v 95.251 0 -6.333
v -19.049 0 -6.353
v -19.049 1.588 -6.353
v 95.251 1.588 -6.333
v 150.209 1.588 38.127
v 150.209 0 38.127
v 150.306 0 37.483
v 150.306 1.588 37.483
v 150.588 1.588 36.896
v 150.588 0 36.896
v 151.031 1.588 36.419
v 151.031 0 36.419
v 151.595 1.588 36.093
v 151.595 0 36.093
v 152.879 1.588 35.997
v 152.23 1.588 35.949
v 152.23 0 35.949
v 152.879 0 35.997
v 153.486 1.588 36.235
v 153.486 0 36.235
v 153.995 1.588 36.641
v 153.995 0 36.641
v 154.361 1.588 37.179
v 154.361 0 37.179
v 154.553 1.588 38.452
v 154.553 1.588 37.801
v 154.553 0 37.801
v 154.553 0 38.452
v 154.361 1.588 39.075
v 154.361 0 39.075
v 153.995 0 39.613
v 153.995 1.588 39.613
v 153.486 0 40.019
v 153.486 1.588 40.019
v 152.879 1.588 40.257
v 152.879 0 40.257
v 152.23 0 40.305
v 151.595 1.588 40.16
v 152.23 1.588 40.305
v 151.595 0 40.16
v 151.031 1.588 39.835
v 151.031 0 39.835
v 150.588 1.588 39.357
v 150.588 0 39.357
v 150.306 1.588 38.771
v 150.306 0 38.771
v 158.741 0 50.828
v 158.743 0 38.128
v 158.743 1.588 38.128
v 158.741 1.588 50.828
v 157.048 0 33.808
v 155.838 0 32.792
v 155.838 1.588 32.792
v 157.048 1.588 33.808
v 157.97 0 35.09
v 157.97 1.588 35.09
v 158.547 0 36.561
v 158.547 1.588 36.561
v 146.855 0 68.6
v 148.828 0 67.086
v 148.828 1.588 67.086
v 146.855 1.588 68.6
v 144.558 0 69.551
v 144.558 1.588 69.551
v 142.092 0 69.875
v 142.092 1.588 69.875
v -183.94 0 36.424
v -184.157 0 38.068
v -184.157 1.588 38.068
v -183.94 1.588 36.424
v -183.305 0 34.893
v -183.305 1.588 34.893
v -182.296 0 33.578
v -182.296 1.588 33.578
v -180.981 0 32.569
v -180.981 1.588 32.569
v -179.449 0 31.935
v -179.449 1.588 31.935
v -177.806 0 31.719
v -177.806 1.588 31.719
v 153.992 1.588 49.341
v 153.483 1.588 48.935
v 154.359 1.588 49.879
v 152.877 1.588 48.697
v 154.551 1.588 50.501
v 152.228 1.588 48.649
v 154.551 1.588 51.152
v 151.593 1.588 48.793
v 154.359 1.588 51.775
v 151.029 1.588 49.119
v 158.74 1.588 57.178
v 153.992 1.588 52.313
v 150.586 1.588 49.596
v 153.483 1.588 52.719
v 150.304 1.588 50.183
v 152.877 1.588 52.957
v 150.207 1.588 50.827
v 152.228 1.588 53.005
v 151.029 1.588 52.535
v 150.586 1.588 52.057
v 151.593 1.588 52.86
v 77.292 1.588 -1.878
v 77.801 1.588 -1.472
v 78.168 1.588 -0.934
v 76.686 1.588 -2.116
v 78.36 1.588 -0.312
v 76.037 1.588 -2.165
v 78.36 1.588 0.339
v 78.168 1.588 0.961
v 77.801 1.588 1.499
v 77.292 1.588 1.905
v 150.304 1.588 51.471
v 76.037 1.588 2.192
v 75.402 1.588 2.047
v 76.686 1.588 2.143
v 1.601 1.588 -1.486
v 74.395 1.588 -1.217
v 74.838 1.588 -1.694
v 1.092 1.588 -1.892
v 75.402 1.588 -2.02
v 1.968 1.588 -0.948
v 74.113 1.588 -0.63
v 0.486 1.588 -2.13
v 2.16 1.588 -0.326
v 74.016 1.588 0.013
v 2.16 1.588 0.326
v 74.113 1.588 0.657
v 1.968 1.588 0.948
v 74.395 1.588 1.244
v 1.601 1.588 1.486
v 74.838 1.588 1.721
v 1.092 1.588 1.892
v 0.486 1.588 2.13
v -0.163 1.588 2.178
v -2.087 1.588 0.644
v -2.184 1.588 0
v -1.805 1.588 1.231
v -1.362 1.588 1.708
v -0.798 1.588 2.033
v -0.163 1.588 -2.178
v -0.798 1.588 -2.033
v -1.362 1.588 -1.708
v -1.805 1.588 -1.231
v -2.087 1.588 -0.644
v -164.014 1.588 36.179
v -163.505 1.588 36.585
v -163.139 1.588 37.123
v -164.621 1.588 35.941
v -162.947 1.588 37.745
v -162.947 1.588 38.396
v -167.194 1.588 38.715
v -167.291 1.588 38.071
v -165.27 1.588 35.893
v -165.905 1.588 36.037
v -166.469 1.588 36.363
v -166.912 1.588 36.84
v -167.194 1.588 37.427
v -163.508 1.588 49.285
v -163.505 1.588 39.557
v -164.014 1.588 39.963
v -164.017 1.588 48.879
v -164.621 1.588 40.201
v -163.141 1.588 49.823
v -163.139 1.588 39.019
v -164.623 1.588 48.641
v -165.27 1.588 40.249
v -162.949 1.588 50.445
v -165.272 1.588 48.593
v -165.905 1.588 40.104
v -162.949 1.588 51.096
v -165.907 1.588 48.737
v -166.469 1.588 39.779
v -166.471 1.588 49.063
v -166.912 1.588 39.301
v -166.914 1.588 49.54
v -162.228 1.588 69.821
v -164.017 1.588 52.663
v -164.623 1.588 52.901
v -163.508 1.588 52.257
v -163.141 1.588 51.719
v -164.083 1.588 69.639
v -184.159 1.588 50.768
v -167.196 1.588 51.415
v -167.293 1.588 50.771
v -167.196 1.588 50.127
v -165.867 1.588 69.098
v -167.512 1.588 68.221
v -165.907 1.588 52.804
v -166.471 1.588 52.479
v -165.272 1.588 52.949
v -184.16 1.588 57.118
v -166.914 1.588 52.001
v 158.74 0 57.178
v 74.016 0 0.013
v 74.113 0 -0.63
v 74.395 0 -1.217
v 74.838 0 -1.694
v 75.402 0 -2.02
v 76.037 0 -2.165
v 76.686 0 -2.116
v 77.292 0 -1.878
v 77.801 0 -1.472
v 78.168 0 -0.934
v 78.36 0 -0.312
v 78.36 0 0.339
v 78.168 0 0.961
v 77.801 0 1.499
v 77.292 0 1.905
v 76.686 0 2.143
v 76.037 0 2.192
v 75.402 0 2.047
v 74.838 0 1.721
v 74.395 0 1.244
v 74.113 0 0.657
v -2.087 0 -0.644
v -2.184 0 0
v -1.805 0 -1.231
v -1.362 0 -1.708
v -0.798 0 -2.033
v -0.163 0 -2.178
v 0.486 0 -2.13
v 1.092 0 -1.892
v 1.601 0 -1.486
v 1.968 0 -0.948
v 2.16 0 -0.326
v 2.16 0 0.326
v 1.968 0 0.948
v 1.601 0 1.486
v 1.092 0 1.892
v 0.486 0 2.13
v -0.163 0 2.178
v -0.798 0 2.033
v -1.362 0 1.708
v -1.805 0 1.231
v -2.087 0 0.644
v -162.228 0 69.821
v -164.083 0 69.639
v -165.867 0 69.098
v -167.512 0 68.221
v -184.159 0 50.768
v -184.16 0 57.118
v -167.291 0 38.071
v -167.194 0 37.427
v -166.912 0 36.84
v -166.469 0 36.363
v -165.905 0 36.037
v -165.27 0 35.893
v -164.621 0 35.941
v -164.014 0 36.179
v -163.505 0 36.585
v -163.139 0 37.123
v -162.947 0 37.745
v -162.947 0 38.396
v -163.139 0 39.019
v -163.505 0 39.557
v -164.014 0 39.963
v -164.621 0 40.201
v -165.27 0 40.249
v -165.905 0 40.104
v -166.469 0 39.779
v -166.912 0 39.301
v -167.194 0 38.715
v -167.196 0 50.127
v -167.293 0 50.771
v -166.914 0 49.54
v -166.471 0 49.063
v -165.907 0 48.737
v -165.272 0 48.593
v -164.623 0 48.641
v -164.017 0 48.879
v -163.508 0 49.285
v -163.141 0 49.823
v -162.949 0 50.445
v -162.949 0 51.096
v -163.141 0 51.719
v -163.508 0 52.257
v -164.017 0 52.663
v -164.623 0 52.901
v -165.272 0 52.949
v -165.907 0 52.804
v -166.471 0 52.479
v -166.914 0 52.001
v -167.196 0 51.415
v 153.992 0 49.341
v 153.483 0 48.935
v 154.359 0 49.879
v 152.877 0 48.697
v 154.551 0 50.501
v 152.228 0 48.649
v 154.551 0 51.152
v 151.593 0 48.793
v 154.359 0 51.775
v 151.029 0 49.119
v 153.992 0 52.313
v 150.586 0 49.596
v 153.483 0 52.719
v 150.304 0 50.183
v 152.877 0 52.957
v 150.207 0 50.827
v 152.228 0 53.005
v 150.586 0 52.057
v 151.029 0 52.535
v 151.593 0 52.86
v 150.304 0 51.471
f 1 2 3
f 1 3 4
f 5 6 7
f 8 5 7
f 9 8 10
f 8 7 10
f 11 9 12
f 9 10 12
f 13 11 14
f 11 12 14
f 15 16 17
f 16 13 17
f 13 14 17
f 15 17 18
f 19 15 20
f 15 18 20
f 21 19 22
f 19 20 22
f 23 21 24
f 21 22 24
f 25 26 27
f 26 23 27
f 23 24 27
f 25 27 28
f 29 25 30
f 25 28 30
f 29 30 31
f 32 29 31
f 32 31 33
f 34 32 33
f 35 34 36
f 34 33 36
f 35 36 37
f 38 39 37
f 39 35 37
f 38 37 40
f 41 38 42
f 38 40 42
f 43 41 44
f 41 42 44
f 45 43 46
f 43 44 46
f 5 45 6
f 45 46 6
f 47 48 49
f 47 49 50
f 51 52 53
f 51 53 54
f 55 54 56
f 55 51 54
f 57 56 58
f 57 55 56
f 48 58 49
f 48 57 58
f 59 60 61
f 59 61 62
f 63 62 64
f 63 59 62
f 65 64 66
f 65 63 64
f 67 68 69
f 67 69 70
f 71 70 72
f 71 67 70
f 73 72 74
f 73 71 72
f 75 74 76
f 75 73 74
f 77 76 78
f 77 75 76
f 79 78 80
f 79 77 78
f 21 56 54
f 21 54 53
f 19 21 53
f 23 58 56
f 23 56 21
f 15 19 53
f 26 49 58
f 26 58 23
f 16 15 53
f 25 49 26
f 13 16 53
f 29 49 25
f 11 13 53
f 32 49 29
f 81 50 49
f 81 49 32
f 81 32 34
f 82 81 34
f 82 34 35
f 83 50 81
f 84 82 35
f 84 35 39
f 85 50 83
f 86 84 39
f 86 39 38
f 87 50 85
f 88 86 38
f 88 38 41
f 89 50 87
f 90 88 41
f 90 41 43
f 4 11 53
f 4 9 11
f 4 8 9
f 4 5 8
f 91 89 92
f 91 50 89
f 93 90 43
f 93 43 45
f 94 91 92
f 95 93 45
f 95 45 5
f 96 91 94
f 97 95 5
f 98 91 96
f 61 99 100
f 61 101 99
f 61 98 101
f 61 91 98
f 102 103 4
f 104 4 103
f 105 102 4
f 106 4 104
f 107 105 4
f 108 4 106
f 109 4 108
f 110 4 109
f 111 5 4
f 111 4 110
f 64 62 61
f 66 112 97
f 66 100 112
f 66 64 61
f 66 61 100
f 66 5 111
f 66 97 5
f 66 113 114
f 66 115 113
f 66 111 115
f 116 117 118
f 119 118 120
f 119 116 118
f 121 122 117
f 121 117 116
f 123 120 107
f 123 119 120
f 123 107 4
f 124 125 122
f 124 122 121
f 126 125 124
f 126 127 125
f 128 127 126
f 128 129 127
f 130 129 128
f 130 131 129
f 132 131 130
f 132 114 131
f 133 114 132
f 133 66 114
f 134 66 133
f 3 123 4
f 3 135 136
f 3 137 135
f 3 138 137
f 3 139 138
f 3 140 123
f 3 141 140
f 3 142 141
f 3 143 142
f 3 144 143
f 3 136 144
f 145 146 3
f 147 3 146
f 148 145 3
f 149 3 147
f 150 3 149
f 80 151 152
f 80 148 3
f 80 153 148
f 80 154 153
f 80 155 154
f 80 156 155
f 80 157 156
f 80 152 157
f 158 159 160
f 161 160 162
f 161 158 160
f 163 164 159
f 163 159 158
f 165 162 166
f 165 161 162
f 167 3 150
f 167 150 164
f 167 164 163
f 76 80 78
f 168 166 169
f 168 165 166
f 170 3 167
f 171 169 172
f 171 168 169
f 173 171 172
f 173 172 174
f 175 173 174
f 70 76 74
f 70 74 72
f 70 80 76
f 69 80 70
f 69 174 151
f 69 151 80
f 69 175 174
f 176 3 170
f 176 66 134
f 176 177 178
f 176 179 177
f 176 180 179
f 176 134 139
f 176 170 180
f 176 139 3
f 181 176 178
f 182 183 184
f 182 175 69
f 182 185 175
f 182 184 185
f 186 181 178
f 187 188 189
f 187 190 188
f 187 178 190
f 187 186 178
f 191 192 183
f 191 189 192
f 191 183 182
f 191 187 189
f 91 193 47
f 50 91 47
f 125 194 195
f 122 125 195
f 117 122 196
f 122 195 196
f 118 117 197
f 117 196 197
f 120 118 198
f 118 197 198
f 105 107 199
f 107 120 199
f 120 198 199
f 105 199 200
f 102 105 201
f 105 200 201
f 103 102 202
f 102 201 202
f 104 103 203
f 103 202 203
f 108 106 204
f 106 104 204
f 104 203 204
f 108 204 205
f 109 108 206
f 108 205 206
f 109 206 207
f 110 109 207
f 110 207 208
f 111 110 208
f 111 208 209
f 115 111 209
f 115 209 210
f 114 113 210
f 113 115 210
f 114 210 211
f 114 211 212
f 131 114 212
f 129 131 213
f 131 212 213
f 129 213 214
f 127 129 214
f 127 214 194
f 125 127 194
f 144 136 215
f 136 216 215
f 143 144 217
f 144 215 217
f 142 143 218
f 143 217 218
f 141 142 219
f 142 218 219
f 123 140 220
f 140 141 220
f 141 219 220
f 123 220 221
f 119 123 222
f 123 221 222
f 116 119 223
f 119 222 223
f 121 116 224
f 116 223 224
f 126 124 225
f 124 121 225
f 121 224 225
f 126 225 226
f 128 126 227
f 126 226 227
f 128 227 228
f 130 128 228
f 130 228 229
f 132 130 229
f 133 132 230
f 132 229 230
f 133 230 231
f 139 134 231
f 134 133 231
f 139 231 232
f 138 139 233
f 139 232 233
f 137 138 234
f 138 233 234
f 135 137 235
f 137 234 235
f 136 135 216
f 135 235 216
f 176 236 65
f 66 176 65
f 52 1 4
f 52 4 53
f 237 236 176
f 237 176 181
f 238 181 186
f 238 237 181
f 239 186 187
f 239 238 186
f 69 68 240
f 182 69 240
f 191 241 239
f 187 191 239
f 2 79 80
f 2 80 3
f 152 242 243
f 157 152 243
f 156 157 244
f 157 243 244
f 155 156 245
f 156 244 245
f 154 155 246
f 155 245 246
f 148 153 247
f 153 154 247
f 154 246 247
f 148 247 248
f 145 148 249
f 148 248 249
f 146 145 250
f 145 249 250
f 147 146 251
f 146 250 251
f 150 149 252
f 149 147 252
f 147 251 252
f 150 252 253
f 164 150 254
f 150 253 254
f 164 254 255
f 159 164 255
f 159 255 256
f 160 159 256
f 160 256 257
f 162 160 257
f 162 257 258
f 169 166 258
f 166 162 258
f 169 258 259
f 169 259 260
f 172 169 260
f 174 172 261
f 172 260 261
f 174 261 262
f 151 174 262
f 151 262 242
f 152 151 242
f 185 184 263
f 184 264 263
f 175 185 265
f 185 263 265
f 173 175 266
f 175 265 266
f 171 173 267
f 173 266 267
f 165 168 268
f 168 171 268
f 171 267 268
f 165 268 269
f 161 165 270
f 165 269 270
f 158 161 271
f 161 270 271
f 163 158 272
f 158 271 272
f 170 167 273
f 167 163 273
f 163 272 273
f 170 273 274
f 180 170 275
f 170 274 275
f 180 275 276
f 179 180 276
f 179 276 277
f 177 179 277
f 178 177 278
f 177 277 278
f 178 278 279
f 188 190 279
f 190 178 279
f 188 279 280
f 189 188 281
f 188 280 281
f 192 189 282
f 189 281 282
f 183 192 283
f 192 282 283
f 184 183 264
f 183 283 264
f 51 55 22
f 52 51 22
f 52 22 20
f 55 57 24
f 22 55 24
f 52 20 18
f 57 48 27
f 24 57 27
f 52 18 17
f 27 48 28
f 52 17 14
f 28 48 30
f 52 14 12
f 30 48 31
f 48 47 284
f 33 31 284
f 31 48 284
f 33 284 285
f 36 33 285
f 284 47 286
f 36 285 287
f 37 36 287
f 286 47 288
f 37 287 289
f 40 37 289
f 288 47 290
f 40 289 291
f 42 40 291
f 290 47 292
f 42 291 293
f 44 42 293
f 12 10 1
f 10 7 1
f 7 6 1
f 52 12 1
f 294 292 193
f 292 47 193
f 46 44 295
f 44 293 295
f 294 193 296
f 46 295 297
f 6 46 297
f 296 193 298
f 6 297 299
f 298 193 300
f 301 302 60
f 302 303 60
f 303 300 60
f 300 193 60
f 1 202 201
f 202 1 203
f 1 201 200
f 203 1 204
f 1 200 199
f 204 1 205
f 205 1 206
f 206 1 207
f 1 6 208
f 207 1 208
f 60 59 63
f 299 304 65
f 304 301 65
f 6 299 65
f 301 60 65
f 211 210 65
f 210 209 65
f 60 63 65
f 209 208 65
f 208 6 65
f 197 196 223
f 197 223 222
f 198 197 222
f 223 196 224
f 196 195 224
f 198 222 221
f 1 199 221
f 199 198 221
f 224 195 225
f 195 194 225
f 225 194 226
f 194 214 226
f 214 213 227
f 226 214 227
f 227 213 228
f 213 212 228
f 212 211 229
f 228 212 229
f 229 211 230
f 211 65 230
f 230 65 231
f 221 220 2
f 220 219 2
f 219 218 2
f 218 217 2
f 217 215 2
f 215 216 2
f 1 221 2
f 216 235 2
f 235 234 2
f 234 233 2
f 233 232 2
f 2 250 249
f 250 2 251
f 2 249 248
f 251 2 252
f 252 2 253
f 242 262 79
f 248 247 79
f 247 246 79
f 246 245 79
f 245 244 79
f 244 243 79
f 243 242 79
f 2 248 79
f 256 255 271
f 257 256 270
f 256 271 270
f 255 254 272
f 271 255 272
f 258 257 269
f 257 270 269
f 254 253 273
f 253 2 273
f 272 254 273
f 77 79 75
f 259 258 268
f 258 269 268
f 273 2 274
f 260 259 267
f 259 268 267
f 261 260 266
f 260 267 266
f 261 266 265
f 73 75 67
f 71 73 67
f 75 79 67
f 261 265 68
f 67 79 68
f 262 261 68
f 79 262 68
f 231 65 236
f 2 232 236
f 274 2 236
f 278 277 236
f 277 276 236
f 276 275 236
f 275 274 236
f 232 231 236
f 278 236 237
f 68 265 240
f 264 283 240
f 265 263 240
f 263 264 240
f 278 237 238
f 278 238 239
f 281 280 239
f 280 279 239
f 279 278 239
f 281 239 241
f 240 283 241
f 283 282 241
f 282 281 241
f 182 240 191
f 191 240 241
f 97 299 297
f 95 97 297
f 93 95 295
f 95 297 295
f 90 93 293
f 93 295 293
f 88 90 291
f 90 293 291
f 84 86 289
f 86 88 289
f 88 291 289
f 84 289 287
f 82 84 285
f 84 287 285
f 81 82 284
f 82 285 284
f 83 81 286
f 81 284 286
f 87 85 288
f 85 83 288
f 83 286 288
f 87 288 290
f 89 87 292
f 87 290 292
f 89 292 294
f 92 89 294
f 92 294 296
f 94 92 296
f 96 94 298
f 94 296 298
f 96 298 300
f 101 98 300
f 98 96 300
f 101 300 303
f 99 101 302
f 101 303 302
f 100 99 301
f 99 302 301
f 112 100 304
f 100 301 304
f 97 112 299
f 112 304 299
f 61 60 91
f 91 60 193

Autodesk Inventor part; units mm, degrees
ref_plane "YZ Plane" through (0, 0, 0) normal (1, 0, 0) x (0, 1, 0)
ref_plane "XZ Plane" through (0, 0, 0) normal (0, 1, 0) x (-1, 0, 0)
ref_plane "XY Plane" through (0, 0, 0) normal (0, 0, 1) x (1, 0, 0)
sketch "main" plane through (0, 0, 0) normal (0, 0, 1) x (1, 0, 0)
  circle A0 centre (45.9011, -170.4057) radius 2.1844
  circle A1 centre (58.6011, -170.4057) radius 2.1844
  arc A2 (39.5511, -183.1057) -> (45.9011, -189.4557) centre (45.9011, -183.1057) ccw
  line L0 (45.9011, -189.4557) -> (58.6011, -189.4557)
  line L1 (39.5511, -183.1057) -> (1.4511, -24.3557)
  arc A3 (76.0514, -172.8053) -> (77.6511, -167.5218) centre (68.1261, -167.5218) ccw
  line L2 (64.9511, -189.4557) -> (76.0514, -172.8053)
  line L3 (58.6011, -189.4557) -> (64.9511, -189.4557)
  circle A4 centre (45.9011, 147.0943) radius 2.1844
  circle A5 centre (58.6011, 147.0943) radius 2.1844
  circle A6 centre (7.8011, -5.3057) radius 2.1844
  circle A7 centre (7.8011, 70.8943) radius 2.1844
  line L4 (77.6511, -167.5218) -> (77.6511, 136.7989)
  line L5 (1.4511, -24.3557) -> (1.4511, 89.9443)
  arc A8 (77.6511, 136.7989) -> (74.8613, 143.5341) centre (68.1261, 136.7989) ccw
  line L6 (74.8613, 143.5341) -> (64.9511, 153.4443)
  line L7 (64.9511, 153.4443) -> (58.6011, 153.4443)
  line L8 (45.9011, 153.4443) -> (58.6011, 153.4443)
  arc A9 (45.9011, 153.4443) -> (40.5661, 150.5382) centre (45.9011, 147.0943) ccw
  line L9 (1.4511, 89.9443) -> (40.5661, 150.5382)
  point P0 (53.0582, -9.4982)
  point P1 (77.6511, -170.4057)
  point P2 (77.6511, -189.4557)
  point P3 (77.6511, 140.7443)
  point P4 (77.6511, 153.4443)
  dimension "d0" = 19.05
  dimension "d1" = 12.7
  dimension "d2" = 19.05
  dimension "d3" = 12.7
  dimension "d4" = 12.7
  dimension "d5" = 19.05
  dimension "d6" = 9.525
sketch "Sketch1" plane through (0, 0, 0) normal (0, 1, 0) x (-1, 0, 0)
  circle A0 centre (165.1067, 38.0709) radius 2.1844
  circle A1 centre (165.109, 50.7709) radius 2.1844
  arc A2 (177.8056, 31.7187) -> (184.1567, 38.0675) centre (177.8067, 38.0687) ccw
  line L0 (184.1567, 38.0675) -> (184.159, 50.7675)
  line L1 (177.8056, 31.7187) -> (19.0489, -6.3534)
  arc A3 (167.5116, 68.2207) -> (162.2284, 69.8214) centre (162.2267, 60.2964) ccw
  line L2 (184.1601, 57.1175) -> (167.5116, 68.2207)
  line L3 (184.159, 50.7675) -> (184.1601, 57.1175)
  circle A4 centre (-152.3933, 38.1269) radius 2.1844
  circle A5 centre (-152.391, 50.8269) radius 2.1844
  circle A6 centre (0, 0) radius 2.1844
  circle A7 centre (-76.2, 0.0134) radius 2.1844
  line L4 (162.2284, 69.8214) -> (-142.0923, 69.8751)
  line L5 (19.0489, -6.3534) -> (-95.2511, -6.3332)
  arc A8 (-142.0923, 69.8751) -> (-148.828, 67.0864) centre (-142.094, 60.3501) ccw
  line L6 (-148.828, 67.0864) -> (-158.7399, 57.178)
  line L7 (-158.7399, 57.178) -> (-158.741, 50.828)
  line L8 (-158.7433, 38.128) -> (-158.741, 50.828)
  arc A9 (-158.7433, 38.128) -> (-155.8381, 32.7925) centre (-152.3933, 38.1269) ccw
  line L9 (-95.2511, -6.3332) -> (-155.8381, 32.7925)
  point P0 (0, 0)
extrude "Extrusion1" add sketch "Sketch1" along normal blind 1.5875
equation "\"d4\" = d3"
properties part number "skirt" material "Acetal Resin, White"
